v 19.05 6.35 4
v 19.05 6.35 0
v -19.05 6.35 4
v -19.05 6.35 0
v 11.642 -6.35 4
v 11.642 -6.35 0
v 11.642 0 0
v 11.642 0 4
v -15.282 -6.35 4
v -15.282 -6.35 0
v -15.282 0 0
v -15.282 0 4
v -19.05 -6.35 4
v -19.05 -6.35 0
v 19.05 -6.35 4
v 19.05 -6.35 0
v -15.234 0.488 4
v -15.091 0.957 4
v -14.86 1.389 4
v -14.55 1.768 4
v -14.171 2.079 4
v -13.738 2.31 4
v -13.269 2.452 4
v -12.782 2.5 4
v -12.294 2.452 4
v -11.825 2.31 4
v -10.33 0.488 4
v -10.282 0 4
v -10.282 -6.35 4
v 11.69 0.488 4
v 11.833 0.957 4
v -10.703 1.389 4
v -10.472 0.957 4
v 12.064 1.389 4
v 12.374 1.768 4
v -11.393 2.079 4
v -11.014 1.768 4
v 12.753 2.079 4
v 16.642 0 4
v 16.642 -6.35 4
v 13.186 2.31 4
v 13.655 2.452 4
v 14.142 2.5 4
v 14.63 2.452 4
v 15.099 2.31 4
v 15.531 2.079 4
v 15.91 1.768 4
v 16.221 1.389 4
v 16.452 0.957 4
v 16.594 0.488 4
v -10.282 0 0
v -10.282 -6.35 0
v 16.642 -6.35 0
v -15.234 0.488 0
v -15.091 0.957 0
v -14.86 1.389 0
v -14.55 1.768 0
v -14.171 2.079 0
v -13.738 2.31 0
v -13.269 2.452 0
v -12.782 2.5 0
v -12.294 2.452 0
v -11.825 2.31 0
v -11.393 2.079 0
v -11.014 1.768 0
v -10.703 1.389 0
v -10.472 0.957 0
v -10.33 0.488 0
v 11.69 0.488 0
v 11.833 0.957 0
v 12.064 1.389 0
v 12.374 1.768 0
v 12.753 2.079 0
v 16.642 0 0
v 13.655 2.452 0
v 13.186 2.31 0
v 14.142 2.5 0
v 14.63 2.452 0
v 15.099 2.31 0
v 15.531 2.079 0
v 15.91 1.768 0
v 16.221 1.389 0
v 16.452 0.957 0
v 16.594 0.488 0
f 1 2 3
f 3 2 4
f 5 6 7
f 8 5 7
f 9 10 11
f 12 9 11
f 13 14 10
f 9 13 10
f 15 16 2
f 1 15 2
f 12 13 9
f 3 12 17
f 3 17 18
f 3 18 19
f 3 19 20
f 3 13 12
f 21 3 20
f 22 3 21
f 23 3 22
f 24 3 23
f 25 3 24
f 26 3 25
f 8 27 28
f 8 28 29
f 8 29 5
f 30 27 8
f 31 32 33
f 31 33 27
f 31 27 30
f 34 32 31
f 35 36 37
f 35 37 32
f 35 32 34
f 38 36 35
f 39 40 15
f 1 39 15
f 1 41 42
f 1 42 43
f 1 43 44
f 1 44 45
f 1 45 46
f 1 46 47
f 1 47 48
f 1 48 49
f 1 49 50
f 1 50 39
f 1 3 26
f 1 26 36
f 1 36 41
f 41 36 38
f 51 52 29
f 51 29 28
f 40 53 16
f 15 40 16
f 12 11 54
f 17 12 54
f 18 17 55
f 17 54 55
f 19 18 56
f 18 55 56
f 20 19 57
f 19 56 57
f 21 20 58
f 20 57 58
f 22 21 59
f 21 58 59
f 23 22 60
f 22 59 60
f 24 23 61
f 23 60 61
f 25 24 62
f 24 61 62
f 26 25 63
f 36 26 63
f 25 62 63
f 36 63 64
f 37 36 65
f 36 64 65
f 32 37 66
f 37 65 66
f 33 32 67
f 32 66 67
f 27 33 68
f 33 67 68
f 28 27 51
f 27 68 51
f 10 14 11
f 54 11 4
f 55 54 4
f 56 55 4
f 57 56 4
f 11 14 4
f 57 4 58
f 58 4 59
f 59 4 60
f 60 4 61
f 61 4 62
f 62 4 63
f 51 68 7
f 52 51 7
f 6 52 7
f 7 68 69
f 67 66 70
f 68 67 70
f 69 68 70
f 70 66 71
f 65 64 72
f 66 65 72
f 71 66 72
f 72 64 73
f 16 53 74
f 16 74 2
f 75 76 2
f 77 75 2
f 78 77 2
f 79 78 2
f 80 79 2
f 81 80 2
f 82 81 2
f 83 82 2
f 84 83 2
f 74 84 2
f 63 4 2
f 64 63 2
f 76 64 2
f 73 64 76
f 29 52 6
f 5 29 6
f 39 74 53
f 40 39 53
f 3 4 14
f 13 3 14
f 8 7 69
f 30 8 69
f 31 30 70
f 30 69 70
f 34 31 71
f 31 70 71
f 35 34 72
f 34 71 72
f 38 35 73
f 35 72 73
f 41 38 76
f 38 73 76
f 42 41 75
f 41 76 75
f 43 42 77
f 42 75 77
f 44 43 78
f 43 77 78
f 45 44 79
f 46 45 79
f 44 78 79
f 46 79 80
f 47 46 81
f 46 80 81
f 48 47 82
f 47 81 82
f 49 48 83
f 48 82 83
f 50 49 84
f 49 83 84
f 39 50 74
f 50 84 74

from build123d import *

# Parameters (mm, degrees)
F0_W     = 21.924
F0_H     = 6.35
F1_DEPTH = 4


with BuildPart() as f1:
    # F0 (on Top) → F1 (new body)
    with BuildSketch(Plane.XY):
        with BuildLine():
            ThreePointArc((-15.281758, 0), (-12.781758, 2.5), (-10.281758, 0))
            Line((-10.281758, 0), (11.642242, 0))
            ThreePointArc((11.642242, 0), (14.142242, 2.5), (16.642242, 0))
            Line((16.642242, 0), (16.642242, -6.35))
            Line((16.642242, -6.35), (19.05, -6.35))
            Line((19.05, -6.35), (19.05, 6.35))
            Line((19.05, 6.35), (-19.05, 6.35))
            Line((-19.05, 6.35), (-19.05, -6.35))
            Line((-19.05, -6.35), (-15.281758, -6.35))
            Line((-15.281758, -6.35), (-15.281758, 0))
        make_face()
        with Locations((0.680242, -3.175)):
            Rectangle(F0_W, F0_H)
    extrude(amount=F1_DEPTH)


solid = f1.part
